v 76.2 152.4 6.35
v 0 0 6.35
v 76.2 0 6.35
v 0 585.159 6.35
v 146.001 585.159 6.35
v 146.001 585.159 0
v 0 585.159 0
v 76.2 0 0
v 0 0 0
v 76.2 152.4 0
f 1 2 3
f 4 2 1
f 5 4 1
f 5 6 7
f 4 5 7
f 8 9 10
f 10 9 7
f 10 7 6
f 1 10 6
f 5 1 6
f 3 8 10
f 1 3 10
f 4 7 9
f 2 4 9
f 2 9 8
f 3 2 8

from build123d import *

# Parameters (mm, degrees)
F1_DEPTH = 6.35


with BuildPart() as f1:
    # F0 (on Top) → F1 (new body)
    with BuildSketch(Plane.XY):
        Polygon((0, 152.4), (0, 0), (76.2, 0), (76.2, 152.4), (76.2, 585.159104), (0, 585.159104), align=None)
        Polygon((76.2, 585.159104), (76.2, 152.4), (146.001304, 585.159104), align=None)
    extrude(amount=F1_DEPTH)


solid = f1.part
